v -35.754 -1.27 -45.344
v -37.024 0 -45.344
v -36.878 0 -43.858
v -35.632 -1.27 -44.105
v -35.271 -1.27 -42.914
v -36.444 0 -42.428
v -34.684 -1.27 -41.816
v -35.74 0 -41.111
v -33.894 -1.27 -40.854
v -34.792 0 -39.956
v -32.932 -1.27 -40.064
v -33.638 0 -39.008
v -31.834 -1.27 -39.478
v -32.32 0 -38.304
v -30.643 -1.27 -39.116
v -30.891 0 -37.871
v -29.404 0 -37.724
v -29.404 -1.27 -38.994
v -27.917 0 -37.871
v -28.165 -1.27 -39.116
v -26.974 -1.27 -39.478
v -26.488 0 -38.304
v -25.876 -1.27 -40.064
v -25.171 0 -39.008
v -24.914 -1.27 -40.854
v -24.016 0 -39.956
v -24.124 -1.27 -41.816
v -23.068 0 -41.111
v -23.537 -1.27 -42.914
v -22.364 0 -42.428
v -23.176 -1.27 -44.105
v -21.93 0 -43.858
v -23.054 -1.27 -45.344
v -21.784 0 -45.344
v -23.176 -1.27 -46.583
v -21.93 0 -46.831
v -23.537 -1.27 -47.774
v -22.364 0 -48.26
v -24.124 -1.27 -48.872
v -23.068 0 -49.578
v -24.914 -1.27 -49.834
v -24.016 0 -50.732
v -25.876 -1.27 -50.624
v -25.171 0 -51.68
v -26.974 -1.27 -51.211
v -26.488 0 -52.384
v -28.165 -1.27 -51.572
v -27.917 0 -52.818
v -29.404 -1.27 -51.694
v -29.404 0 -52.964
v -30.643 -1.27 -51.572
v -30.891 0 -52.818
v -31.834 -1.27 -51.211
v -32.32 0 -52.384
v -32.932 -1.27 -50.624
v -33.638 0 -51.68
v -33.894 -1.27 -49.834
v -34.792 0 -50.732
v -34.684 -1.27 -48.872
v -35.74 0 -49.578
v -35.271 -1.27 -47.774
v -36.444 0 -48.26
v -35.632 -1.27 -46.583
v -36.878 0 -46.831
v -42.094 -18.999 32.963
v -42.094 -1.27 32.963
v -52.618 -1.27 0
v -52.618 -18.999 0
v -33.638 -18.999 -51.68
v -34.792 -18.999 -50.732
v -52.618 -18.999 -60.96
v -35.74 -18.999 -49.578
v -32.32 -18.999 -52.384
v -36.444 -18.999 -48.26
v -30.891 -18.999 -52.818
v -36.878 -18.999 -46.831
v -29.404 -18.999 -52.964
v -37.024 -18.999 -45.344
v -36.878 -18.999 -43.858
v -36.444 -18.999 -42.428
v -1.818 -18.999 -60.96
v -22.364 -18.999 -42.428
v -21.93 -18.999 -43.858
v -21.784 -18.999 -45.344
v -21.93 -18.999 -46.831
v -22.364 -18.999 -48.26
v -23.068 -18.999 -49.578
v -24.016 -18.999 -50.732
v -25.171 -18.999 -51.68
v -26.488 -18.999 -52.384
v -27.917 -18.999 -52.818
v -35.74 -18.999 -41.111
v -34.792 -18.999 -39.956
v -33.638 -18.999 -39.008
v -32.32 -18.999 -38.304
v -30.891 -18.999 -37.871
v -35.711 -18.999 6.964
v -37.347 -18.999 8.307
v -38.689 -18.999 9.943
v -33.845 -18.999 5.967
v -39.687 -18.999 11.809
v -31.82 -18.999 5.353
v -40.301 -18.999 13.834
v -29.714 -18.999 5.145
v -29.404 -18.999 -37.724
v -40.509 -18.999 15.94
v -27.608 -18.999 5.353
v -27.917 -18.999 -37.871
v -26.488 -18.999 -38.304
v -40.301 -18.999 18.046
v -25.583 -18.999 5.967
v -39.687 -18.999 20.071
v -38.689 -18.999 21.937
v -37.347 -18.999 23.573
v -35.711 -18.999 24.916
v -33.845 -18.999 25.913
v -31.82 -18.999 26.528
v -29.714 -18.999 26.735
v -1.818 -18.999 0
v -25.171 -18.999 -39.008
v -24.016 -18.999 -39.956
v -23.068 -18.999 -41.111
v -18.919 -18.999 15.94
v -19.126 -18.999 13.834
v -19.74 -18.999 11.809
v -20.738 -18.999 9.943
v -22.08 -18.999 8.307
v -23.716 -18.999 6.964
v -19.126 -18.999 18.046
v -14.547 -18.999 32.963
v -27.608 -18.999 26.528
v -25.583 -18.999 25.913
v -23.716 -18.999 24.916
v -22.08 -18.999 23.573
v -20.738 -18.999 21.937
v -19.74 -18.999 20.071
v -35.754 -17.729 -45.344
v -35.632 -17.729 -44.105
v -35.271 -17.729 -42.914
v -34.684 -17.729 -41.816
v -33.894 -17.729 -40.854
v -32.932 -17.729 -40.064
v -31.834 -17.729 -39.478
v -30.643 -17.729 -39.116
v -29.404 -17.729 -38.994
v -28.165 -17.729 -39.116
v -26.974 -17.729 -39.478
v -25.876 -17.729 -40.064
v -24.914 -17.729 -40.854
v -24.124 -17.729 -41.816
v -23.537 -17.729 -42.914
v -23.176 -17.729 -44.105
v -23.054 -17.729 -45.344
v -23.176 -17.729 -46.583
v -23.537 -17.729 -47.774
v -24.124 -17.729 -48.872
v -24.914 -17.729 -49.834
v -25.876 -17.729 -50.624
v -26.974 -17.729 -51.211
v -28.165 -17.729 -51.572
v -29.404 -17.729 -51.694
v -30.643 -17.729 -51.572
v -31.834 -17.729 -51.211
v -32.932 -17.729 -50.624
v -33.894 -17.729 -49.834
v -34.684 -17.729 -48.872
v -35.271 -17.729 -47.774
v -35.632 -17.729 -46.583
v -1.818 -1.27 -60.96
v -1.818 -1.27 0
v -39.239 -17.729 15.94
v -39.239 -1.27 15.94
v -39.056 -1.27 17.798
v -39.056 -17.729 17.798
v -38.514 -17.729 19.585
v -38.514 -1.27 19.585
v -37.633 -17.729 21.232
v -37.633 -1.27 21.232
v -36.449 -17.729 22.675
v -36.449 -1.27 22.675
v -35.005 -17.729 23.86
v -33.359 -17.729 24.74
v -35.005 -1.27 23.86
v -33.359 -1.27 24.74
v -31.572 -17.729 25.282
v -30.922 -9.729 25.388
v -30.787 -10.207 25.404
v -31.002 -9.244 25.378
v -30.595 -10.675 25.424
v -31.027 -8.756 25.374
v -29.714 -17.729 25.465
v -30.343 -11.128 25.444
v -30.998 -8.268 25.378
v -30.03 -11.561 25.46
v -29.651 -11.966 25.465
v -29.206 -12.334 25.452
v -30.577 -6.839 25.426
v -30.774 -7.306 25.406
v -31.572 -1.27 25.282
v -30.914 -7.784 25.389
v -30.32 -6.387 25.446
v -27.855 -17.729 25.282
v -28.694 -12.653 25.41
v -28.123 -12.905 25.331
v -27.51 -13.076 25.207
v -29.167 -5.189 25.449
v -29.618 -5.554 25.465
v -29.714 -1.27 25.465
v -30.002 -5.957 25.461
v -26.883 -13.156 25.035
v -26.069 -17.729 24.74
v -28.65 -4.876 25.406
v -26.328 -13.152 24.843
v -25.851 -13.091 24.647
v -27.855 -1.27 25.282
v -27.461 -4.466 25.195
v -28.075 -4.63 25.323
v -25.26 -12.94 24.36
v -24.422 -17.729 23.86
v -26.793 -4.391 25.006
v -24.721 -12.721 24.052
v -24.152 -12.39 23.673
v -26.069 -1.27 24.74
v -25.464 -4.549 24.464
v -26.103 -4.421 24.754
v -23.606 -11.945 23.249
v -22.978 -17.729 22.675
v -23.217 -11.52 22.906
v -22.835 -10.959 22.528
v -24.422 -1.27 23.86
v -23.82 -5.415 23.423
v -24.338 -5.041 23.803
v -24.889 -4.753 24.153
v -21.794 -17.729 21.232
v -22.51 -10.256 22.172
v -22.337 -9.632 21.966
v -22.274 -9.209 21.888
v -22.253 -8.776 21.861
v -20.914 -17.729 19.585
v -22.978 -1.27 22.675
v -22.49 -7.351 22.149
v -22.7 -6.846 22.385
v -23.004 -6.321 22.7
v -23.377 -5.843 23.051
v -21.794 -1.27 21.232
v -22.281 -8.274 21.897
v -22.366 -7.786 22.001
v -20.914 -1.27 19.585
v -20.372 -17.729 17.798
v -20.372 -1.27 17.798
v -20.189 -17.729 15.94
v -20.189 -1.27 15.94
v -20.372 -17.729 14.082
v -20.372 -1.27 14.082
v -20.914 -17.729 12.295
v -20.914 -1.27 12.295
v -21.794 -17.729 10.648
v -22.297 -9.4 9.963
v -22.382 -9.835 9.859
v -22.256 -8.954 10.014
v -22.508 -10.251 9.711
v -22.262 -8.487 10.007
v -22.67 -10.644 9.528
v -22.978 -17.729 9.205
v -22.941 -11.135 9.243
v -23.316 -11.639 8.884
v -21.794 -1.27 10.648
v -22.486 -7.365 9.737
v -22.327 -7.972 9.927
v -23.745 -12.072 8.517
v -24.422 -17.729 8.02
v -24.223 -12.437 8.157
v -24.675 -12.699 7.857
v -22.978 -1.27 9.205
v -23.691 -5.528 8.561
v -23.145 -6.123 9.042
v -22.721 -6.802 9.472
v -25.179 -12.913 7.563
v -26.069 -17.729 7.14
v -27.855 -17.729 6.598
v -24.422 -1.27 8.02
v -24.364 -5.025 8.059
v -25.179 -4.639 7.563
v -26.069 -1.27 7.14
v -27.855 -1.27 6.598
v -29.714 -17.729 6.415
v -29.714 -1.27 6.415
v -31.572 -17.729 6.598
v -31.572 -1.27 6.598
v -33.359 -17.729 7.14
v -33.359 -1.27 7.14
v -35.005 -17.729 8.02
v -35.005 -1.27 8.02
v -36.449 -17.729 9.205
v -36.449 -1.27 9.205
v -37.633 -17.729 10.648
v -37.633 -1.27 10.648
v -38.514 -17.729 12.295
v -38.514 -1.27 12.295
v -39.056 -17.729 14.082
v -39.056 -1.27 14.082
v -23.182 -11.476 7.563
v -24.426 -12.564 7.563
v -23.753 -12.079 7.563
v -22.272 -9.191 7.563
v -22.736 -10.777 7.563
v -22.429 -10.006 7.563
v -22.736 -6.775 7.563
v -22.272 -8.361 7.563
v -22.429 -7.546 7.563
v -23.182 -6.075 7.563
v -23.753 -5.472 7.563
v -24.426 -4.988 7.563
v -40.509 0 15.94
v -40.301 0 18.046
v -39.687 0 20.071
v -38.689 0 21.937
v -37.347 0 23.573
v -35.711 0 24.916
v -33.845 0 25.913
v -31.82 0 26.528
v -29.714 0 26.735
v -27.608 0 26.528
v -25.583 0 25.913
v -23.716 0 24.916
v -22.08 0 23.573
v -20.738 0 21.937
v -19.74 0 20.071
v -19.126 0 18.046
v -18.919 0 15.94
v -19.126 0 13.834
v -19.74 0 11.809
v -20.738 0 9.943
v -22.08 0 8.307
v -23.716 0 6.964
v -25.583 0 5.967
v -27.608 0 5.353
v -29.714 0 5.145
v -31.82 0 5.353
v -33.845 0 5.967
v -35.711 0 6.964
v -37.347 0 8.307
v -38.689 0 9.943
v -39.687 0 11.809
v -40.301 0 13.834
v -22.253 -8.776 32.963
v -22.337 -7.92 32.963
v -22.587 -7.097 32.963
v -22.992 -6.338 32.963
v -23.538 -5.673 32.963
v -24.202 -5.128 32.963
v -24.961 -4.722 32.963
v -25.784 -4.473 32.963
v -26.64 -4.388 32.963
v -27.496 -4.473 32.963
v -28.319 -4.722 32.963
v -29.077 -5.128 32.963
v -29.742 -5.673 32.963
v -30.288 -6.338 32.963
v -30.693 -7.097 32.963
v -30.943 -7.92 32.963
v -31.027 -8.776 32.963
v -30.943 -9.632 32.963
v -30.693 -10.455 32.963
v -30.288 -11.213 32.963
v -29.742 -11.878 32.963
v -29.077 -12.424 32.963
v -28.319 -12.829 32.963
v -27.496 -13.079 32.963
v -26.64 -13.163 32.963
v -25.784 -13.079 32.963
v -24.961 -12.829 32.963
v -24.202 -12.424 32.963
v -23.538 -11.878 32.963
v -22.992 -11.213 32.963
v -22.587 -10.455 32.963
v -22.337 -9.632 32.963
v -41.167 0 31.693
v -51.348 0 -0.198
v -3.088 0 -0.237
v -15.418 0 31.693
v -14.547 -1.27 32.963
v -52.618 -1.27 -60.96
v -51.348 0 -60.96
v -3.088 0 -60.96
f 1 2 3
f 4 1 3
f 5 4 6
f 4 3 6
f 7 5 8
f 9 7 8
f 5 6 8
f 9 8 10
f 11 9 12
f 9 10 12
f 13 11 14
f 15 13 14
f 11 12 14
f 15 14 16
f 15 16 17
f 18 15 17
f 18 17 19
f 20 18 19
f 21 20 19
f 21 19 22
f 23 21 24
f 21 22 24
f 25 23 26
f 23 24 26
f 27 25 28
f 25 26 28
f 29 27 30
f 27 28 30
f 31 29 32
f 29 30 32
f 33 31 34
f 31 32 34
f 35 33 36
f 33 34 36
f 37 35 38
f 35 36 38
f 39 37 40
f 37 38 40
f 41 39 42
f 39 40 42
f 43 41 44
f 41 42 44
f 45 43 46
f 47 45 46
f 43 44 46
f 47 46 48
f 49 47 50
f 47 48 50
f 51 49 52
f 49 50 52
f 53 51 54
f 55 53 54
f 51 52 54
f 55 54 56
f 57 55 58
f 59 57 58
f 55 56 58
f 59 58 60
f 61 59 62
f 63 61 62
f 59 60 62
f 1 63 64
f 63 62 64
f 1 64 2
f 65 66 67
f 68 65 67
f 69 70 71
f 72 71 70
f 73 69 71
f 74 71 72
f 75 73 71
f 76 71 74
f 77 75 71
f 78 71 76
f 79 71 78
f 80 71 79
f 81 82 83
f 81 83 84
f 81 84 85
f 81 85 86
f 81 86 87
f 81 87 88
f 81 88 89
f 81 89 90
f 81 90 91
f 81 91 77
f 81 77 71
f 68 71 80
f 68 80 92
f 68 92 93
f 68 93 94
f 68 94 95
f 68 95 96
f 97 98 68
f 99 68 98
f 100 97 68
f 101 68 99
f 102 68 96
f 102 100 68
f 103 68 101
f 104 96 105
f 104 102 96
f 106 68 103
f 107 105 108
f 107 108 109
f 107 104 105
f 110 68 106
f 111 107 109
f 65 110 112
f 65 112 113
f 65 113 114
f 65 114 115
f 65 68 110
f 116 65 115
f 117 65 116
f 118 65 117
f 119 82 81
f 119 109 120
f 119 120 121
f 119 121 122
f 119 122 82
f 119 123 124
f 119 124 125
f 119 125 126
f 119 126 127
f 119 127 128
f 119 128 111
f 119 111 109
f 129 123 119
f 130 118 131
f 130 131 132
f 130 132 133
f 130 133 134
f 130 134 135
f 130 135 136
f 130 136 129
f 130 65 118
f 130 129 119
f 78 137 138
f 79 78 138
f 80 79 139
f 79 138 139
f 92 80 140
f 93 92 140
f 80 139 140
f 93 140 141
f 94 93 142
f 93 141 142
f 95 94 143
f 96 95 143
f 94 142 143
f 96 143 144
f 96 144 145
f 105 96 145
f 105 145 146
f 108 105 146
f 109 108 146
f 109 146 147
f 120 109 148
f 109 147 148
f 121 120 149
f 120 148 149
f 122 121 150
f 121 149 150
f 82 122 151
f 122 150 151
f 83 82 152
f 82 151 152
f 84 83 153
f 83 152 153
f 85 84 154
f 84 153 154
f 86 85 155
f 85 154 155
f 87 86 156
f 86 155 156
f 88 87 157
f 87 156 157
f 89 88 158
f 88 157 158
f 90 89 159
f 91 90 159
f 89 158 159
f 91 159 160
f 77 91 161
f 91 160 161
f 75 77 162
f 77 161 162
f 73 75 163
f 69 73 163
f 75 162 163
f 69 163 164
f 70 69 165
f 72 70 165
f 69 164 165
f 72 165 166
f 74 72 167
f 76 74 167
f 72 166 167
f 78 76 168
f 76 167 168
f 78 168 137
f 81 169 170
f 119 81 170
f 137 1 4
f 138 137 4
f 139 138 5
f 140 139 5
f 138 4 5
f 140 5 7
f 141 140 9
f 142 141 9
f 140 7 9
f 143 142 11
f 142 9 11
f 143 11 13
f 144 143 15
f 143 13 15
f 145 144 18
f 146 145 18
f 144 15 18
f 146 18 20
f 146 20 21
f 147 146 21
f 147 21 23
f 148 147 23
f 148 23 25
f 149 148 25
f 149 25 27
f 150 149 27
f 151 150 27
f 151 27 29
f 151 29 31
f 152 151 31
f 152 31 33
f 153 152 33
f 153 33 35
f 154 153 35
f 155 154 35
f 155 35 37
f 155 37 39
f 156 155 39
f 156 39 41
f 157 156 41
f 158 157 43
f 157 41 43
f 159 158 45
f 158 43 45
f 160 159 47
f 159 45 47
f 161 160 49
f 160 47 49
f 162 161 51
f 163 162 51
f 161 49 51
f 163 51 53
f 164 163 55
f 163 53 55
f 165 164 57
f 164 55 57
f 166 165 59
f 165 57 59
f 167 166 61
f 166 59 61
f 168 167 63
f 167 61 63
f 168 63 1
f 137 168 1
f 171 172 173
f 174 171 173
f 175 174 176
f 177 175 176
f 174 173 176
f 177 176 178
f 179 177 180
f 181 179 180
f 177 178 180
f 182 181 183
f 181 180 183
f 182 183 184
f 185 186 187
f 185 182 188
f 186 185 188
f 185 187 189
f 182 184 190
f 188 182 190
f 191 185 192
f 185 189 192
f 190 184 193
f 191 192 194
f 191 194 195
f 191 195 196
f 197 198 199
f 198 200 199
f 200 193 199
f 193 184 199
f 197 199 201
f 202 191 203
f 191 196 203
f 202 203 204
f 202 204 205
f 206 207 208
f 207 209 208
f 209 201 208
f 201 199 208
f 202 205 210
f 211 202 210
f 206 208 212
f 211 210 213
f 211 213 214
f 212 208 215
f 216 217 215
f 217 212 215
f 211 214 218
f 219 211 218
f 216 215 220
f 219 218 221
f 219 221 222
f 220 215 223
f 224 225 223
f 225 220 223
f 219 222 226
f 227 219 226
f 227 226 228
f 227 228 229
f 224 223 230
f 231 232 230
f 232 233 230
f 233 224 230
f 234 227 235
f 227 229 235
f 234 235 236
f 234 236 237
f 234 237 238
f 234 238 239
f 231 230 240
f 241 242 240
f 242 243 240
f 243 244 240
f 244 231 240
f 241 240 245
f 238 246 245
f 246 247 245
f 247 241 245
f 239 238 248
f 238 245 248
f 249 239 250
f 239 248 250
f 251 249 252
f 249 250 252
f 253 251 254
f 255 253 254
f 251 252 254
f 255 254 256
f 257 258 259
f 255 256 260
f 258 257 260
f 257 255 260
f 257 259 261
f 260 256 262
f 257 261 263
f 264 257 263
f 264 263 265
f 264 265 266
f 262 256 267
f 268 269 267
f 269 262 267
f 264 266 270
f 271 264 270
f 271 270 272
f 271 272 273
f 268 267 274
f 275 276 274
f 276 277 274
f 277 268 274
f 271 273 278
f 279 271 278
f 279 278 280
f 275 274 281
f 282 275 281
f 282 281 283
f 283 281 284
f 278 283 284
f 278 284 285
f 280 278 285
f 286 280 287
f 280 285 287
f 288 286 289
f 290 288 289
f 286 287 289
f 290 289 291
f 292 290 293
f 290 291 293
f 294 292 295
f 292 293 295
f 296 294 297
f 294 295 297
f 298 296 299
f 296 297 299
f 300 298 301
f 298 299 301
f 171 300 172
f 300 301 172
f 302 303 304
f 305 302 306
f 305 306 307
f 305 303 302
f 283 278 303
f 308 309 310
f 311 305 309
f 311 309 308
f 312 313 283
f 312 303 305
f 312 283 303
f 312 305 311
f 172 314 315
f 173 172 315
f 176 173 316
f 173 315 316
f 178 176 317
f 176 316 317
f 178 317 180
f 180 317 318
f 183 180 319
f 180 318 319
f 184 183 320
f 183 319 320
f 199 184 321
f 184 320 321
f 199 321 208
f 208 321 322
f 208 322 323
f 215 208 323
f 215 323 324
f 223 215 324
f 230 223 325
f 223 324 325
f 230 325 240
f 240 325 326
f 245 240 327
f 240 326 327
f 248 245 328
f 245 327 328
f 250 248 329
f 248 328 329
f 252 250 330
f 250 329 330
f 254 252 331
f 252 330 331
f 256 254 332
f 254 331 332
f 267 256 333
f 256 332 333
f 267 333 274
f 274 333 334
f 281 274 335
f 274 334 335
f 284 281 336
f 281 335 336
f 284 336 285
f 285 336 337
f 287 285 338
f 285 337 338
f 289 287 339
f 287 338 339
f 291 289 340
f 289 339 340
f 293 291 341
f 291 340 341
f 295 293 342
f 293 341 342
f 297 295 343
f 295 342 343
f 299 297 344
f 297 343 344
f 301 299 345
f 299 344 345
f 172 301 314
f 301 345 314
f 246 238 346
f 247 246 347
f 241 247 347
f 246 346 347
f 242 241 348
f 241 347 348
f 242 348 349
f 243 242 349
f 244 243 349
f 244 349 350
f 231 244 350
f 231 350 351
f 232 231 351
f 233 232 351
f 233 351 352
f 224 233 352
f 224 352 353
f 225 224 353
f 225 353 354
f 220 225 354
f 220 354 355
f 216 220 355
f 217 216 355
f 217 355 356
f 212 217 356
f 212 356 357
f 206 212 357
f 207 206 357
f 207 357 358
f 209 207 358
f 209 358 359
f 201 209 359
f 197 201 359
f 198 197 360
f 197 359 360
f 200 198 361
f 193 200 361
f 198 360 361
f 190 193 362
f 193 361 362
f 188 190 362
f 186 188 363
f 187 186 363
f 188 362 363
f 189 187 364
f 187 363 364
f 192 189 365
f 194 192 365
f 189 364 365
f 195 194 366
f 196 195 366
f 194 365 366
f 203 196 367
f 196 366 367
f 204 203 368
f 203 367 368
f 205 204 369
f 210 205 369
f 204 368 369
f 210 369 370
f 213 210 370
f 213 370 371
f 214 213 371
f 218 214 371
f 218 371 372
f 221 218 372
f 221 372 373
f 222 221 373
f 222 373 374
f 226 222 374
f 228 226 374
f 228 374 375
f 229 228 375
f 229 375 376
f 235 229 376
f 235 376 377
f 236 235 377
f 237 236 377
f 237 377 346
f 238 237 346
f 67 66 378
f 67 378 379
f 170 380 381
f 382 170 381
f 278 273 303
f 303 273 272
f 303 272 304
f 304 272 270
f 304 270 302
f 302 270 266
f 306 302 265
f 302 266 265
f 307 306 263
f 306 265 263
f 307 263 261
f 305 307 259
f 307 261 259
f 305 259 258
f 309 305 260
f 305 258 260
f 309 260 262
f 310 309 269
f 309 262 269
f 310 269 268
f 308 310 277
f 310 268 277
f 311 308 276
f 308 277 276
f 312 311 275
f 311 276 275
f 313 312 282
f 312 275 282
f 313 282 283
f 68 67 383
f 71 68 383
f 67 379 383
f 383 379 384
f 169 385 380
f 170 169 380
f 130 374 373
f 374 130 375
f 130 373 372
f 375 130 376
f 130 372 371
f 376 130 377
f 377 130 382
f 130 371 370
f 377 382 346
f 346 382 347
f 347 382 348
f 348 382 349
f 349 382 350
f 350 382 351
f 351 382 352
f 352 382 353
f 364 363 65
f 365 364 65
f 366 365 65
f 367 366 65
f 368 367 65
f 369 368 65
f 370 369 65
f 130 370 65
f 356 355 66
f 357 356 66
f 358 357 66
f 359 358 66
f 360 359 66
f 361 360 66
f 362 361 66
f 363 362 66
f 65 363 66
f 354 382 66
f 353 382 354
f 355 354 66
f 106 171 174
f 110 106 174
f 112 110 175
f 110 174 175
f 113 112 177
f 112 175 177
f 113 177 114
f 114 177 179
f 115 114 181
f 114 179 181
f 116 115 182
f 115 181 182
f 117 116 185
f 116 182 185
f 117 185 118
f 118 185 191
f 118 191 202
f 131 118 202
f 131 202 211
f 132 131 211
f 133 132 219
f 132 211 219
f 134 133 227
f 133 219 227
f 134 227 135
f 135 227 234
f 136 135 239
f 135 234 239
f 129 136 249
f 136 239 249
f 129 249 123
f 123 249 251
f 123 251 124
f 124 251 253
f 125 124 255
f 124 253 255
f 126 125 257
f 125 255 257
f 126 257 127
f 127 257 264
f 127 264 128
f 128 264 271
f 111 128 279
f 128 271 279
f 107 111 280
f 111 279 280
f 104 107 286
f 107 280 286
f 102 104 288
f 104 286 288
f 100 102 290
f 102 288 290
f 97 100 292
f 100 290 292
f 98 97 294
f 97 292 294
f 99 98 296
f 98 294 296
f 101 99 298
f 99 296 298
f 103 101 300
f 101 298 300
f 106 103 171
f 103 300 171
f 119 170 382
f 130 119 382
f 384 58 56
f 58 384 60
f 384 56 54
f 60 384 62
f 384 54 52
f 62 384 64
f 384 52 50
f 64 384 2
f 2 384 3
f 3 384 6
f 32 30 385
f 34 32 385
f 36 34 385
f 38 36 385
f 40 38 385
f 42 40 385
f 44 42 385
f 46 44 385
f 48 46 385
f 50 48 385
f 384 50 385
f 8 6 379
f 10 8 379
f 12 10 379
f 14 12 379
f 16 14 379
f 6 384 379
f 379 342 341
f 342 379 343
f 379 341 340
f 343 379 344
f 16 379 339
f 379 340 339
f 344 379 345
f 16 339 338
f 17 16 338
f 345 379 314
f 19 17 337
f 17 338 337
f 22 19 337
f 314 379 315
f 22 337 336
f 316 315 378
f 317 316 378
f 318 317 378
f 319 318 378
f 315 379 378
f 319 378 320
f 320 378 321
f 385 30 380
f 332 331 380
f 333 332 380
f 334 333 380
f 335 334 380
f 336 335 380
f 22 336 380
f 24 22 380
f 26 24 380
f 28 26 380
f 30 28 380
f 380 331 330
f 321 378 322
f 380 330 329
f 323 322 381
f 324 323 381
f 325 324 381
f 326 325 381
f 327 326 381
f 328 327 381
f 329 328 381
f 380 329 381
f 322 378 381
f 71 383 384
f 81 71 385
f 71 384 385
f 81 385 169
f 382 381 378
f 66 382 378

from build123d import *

# Parameters (mm, degrees)
F1_DEPTH = 18.9992
F3_D     = 19.05
F4_D     = 12.7
F5_R     = 4.3873111452
F6_DEPTH = 25.4
F7_SIZE  = 1.27


with BuildPart() as f1:
    # F0 (on Front) → F1 (new body)
    with BuildSketch(Plane.XZ):
        Polygon((-52.6177957654, 0), (-52.6177957654, -60.96), (-1.8177957654, -60.96), (-1.8177957654, 0), (-14.5472735167, 32.9634994268), (-34.6658416092, 32.9634994268), (-42.0942343771, 32.9634994268), align=None)
    extrude(amount=F1_DEPTH)

    # F3 (through all)
    with Locations(Plane.XZ.offset(18.9992)):
        with Locations((-29.7135785222, 15.9400962293)):
            Hole(F3_D / 2)

    # F4 (through all)
    with Locations(Plane.XZ.offset(18.9992)):
        with Locations((-29.4040627778, -45.3441590071)):
            Hole(F4_D / 2)

    # F5 (on face) → F6 (cut)
    with BuildSketch(Plane.XY.offset(32.9634994268)):
        with Locations((-26.6399271786, -8.7757343426)):
            Circle(F5_R)
    extrude(amount=-F6_DEPTH, mode=Mode.SUBTRACT)

    # F7
    f7_edges = [f1.edges().sort_by_distance(p)[0] for p in [
        (-47.356015, 0, 16.48175),
        (-52.617796, 0, -30.48),
        (-1.817796, 0, -30.48),
        (-8.182535, 0, 16.48175),
        (-28.320754, 0, 32.963499),
        (-35.754063, -18.9992, -45.344159),
        (-39.238579, -18.9992, 15.940096),
        (-39.238579, 0, 15.940096),
        (-35.754063, 0, -45.344159),
    ]]
    chamfer(f7_edges, length=F7_SIZE)


solid = f1.part
